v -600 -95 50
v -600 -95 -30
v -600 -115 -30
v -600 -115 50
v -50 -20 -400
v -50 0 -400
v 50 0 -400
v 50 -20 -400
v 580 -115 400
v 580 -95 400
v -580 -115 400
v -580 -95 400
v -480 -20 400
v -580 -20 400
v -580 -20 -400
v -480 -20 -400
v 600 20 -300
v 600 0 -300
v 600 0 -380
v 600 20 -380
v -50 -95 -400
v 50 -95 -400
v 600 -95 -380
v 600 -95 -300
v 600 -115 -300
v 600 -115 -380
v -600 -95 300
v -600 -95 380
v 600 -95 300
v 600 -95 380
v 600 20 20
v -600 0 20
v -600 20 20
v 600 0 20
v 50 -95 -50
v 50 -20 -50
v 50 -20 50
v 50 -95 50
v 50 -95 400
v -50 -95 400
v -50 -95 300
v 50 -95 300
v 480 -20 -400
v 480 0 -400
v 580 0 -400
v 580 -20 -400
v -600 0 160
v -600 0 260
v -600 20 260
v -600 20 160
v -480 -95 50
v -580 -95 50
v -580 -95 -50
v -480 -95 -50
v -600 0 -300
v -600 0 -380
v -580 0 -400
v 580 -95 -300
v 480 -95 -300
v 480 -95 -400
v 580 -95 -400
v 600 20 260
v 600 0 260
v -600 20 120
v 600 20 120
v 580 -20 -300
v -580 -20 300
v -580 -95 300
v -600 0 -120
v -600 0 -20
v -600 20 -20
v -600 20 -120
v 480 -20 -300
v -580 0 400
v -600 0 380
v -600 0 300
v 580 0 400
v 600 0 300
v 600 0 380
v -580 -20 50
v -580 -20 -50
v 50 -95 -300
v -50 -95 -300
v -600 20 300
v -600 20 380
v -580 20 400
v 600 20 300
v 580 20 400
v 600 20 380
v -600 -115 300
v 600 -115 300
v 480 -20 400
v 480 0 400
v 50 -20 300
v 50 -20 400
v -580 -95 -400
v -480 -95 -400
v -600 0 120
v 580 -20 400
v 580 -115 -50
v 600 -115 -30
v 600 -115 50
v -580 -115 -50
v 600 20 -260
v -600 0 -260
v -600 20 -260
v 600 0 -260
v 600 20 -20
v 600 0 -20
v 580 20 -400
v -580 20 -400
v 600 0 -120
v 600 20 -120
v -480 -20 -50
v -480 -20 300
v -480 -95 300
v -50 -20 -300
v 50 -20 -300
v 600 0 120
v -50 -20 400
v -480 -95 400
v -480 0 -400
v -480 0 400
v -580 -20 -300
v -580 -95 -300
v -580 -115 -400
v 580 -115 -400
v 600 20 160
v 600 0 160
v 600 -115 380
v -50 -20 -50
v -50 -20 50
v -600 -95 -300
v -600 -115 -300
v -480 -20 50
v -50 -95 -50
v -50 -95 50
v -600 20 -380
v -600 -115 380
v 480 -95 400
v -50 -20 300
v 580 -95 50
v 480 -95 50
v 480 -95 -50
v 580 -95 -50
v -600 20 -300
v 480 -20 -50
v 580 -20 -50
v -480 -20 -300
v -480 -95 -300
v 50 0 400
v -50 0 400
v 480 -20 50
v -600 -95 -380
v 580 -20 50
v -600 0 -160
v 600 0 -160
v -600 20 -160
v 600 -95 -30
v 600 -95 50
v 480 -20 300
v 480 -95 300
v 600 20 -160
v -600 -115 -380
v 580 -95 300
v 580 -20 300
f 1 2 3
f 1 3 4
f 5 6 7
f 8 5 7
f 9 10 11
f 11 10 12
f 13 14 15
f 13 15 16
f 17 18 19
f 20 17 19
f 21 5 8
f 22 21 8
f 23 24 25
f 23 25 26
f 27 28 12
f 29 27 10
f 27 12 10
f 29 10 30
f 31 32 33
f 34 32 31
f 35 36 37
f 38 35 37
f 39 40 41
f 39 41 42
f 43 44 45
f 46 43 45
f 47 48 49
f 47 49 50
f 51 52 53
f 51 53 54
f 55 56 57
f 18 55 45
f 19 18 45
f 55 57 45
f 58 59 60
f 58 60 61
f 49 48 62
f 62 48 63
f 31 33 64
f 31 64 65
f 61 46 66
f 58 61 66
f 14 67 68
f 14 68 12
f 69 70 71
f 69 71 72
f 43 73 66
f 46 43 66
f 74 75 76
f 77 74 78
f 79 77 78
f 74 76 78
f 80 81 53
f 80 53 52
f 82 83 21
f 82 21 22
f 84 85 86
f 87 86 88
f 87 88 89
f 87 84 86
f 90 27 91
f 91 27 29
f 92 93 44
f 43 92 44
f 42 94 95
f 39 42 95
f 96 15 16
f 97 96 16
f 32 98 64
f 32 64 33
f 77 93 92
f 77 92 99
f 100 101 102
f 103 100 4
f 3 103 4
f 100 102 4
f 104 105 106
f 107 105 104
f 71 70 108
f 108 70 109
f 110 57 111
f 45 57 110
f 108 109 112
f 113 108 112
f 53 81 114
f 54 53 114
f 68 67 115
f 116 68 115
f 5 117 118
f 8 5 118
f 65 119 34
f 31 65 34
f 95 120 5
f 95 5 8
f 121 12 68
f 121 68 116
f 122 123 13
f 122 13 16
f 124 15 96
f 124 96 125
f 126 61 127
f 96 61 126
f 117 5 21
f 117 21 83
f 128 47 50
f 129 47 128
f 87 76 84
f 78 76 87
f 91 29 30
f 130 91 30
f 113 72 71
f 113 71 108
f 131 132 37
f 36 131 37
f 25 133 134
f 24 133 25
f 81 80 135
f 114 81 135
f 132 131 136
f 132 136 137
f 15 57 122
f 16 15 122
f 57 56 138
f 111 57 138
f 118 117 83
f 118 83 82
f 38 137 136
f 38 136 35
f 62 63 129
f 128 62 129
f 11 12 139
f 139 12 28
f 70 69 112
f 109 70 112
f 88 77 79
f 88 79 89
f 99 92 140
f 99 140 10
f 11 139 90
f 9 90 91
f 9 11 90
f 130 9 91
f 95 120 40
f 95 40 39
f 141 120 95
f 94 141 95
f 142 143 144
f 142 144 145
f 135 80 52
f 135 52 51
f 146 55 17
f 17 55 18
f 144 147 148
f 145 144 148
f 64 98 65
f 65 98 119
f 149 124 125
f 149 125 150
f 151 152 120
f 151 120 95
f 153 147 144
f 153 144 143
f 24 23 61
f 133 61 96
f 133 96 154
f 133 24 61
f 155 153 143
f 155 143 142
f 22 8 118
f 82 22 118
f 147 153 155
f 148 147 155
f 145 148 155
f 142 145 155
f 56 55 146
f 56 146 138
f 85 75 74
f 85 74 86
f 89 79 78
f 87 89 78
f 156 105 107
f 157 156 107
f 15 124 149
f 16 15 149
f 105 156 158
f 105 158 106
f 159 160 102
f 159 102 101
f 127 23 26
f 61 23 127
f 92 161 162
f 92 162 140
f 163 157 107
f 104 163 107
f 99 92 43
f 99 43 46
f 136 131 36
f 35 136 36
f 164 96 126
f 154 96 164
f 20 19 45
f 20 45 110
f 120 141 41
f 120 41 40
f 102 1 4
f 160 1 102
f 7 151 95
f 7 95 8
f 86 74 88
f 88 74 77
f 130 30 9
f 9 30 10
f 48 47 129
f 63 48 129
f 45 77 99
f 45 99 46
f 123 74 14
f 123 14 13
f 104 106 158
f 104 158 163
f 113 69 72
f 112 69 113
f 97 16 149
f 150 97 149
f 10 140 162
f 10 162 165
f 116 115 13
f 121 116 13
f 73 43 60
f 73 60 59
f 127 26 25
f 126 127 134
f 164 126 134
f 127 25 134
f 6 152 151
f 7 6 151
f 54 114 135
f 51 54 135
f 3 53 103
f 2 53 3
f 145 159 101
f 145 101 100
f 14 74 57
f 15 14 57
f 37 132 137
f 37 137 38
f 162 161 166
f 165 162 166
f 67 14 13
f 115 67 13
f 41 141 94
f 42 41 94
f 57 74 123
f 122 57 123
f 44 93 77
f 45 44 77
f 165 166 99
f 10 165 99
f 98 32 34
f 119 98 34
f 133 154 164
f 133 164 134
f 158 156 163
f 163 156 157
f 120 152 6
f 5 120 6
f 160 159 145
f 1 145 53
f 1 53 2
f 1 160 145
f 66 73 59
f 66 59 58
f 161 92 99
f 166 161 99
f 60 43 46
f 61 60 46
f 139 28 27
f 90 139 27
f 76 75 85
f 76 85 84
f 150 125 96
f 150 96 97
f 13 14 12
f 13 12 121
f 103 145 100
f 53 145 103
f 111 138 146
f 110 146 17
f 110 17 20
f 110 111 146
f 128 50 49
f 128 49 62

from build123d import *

# Parameters (mm, degrees)
ESQUISSE1_W          = 1200
ESQUISSE1_H          = 100
BOSS_EXTRU_1_DEPTH   = 20
BOSS_EXTRU_1_2_DEPTH = 20
BOSS_EXTRU_1_3_DEPTH = 20
BOSS_EXTRU_1_4_DEPTH = 20
BOSS_EXTRU_1_5_DEPTH = 20
BOSS_EXTRU_1_6_DEPTH = 20
CHANFREIN1_SIZE      = 20
CHANFREIN2_SIZE      = 20
ESQUISSE2_W          = 100
ESQUISSE2_H          = 800
BOSS_EXTRU_2_DEPTH   = 20
BOSS_EXTRU_2_2_DEPTH = 20
BOSS_EXTRU_2_3_DEPTH = 20
ESQUISSE3_W          = 100
ESQUISSE3_H          = 100
BOSS_EXTRU_3_DEPTH   = 75
BOSS_EXTRU_3_2_DEPTH = 75
BOSS_EXTRU_3_3_DEPTH = 75
BOSS_EXTRU_3_4_DEPTH = 75
BOSS_EXTRU_3_5_DEPTH = 75
BOSS_EXTRU_3_6_DEPTH = 75
BOSS_EXTRU_3_7_DEPTH = 75
BOSS_EXTRU_3_8_DEPTH = 75
BOSS_EXTRU_3_9_DEPTH = 75
BOSS_EXTRU_4_DEPTH   = 20
BOSS_EXTRU_4_2_DEPTH = 20
BOSS_EXTRU_4_3_DEPTH = 20


with BuildPart() as part:
    # Esquisse1 → Boss.-Extru.1 (new body)
    with BuildSketch(Plane(origin=(0, 0, 0), x_dir=(1, 0, 0), z_dir=(0, 1, 0))):
        with Locations((0, 350)):
            Rectangle(ESQUISSE1_W, ESQUISSE1_H)
    extrude(amount=BOSS_EXTRU_1_DEPTH)

    # Chanfrein2
    chanfrein2_edges = [part.edges().sort_by_distance(p)[0] for p in [
        (-600, 10, -400),
        (600, 10, -400),
    ]]
    chamfer(chanfrein2_edges, length=CHANFREIN2_SIZE)


with BuildPart() as body_2:
    # Esquisse1 → Boss.-Extru.1 2 (new body)
    with BuildSketch(Plane(origin=(0, 0, 0), x_dir=(1, 0, 0), z_dir=(0, 1, 0))):
        with Locations((0, 210)):
            Rectangle(ESQUISSE1_W, ESQUISSE1_H)
    extrude(amount=BOSS_EXTRU_1_2_DEPTH)


with BuildPart() as body_3:
    # Esquisse1 → Boss.-Extru.1 3 (new body)
    with BuildSketch(Plane(origin=(0, 0, 0), x_dir=(1, 0, 0), z_dir=(0, 1, 0))):
        with Locations((0, 70)):
            Rectangle(ESQUISSE1_W, ESQUISSE1_H)
    extrude(amount=BOSS_EXTRU_1_3_DEPTH)


with BuildPart() as body_4:
    # Esquisse1 → Boss.-Extru.1 4 (new body)
    with BuildSketch(Plane(origin=(0, 0, 0), x_dir=(1, 0, 0), z_dir=(0, 1, 0))):
        with Locations((0, -70)):
            Rectangle(ESQUISSE1_W, ESQUISSE1_H)
    extrude(amount=BOSS_EXTRU_1_4_DEPTH)


with BuildPart() as body_5:
    # Esquisse1 → Boss.-Extru.1 5 (new body)
    with BuildSketch(Plane(origin=(0, 0, 0), x_dir=(1, 0, 0), z_dir=(0, 1, 0))):
        with Locations((0, -210)):
            Rectangle(ESQUISSE1_W, ESQUISSE1_H)
    extrude(amount=BOSS_EXTRU_1_5_DEPTH)


with BuildPart() as body_6:
    # Esquisse1 → Boss.-Extru.1 6 (new body)
    with BuildSketch(Plane(origin=(0, 0, 0), x_dir=(1, 0, 0), z_dir=(0, 1, 0))):
        with Locations((0, -350)):
            Rectangle(ESQUISSE1_W, ESQUISSE1_H)
    extrude(amount=BOSS_EXTRU_1_6_DEPTH)

    # Chanfrein1
    chanfrein1_edges = [body_6.edges().sort_by_distance(p)[0] for p in [
        (-600, 10, 400),
        (600, 10, 400),
    ]]
    chamfer(chanfrein1_edges, length=CHANFREIN1_SIZE)


with BuildPart() as body_7:
    # Esquisse2 → Boss.-Extru.2 (new body)
    with BuildSketch(Plane(origin=(0, 0, 0), x_dir=(1, 0, 0), z_dir=(0, 1, 0))):
        with Locations((-530, 0)):
            Rectangle(ESQUISSE2_W, ESQUISSE2_H)
    extrude(amount=-BOSS_EXTRU_2_DEPTH)


with BuildPart() as body_8:
    # Esquisse2 → Boss.-Extru.2 2 (new body)
    with BuildSketch(Plane(origin=(0, 0, 0), x_dir=(1, 0, 0), z_dir=(0, 1, 0))):
        Rectangle(ESQUISSE2_W, ESQUISSE2_H)
    extrude(amount=-BOSS_EXTRU_2_2_DEPTH)


with BuildPart() as body_9:
    # Esquisse2 → Boss.-Extru.2 3 (new body)
    with BuildSketch(Plane(origin=(0, 0, 0), x_dir=(1, 0, 0), z_dir=(0, 1, 0))):
        with Locations((530, 0)):
            Rectangle(ESQUISSE2_W, ESQUISSE2_H)
    extrude(amount=-BOSS_EXTRU_2_3_DEPTH)


with BuildPart() as body_10:
    # Esquisse3 → Boss.-Extru.3 (new body)
    with BuildSketch(Plane.XZ.offset(20)):
        with Locations((-530, 350)):
            Rectangle(ESQUISSE3_W, ESQUISSE3_H)
    extrude(amount=BOSS_EXTRU_3_DEPTH)


with BuildPart() as body_11:
    # Esquisse3 → Boss.-Extru.3 2 (new body)
    with BuildSketch(Plane.XZ.offset(20)):
        with Locations((0, 350)):
            Rectangle(ESQUISSE3_W, ESQUISSE3_H)
    extrude(amount=BOSS_EXTRU_3_2_DEPTH)


with BuildPart() as body_12:
    # Esquisse3 → Boss.-Extru.3 3 (new body)
    with BuildSketch(Plane.XZ.offset(20)):
        with Locations((530, 350)):
            Rectangle(ESQUISSE3_W, ESQUISSE3_H)
    extrude(amount=BOSS_EXTRU_3_3_DEPTH)


with BuildPart() as body_13:
    # Esquisse3 → Boss.-Extru.3 4 (new body)
    with BuildSketch(Plane.XZ.offset(20)):
        with Locations((530, -350)):
            Rectangle(ESQUISSE3_W, ESQUISSE3_H)
    extrude(amount=BOSS_EXTRU_3_4_DEPTH)


with BuildPart() as body_14:
    # Esquisse3 → Boss.-Extru.3 5 (new body)
    with BuildSketch(Plane.XZ.offset(20)):
        with Locations((0, -350)):
            Rectangle(ESQUISSE3_W, ESQUISSE3_H)
    extrude(amount=BOSS_EXTRU_3_5_DEPTH)


with BuildPart() as body_15:
    # Esquisse3 → Boss.-Extru.3 6 (new body)
    with BuildSketch(Plane.XZ.offset(20)):
        with Locations((-530, -350)):
            Rectangle(ESQUISSE3_W, ESQUISSE3_H)
    extrude(amount=BOSS_EXTRU_3_6_DEPTH)


with BuildPart() as body_16:
    # Esquisse3 → Boss.-Extru.3 7 (new body)
    with BuildSketch(Plane.XZ.offset(20)):
        with Locations((-530, 0)):
            Rectangle(ESQUISSE3_W, ESQUISSE3_H)
    extrude(amount=BOSS_EXTRU_3_7_DEPTH)


with BuildPart() as body_17:
    # Esquisse3 → Boss.-Extru.3 8 (new body)
    with BuildSketch(Plane.XZ.offset(20)):
        with Locations((530, 0)):
            Rectangle(ESQUISSE3_W, ESQUISSE3_H)
    extrude(amount=BOSS_EXTRU_3_8_DEPTH)


with BuildPart() as body_18:
    # Esquisse3 → Boss.-Extru.3 9 (new body)
    with BuildSketch(Plane.XZ.offset(20)):
        Rectangle(ESQUISSE3_W, ESQUISSE3_H)
    extrude(amount=BOSS_EXTRU_3_9_DEPTH)


with BuildPart() as body_19:
    # Esquisse4 → Boss.-Extru.4 (new body)
    with BuildSketch(Plane.XZ.offset(95)):
        Polygon((580, 400), (-580, 400), (-600, 380), (-600, 300), (600, 300), (600, 380), align=None)
    extrude(amount=BOSS_EXTRU_4_DEPTH)


with BuildPart() as body_20:
    # Esquisse4 → Boss.-Extru.4 2 (new body)
    with BuildSketch(Plane.XZ.offset(95)):
        Polygon((600, -380), (580, -400), (-580, -400), (-600, -380), (-600, -300), (600, -300), align=None)
    extrude(amount=BOSS_EXTRU_4_2_DEPTH)


with BuildPart() as body_21:
    # Esquisse4 → Boss.-Extru.4 3 (new body)
    with BuildSketch(Plane.XZ.offset(95)):
        Polygon((580, -50), (-580, -50), (-600, -30), (-600, 50), (600, 50), (600, -30), align=None)
    extrude(amount=BOSS_EXTRU_4_3_DEPTH)


solid = Compound([part.part, body_2.part, body_3.part, body_4.part, body_5.part, body_6.part, body_7.part, body_8.part, body_9.part, body_10.part, body_11.part, body_12.part, body_13.part, body_14.part, body_15.part, body_16.part, body_17.part, body_18.part, body_19.part, body_20.part, body_21.part])
